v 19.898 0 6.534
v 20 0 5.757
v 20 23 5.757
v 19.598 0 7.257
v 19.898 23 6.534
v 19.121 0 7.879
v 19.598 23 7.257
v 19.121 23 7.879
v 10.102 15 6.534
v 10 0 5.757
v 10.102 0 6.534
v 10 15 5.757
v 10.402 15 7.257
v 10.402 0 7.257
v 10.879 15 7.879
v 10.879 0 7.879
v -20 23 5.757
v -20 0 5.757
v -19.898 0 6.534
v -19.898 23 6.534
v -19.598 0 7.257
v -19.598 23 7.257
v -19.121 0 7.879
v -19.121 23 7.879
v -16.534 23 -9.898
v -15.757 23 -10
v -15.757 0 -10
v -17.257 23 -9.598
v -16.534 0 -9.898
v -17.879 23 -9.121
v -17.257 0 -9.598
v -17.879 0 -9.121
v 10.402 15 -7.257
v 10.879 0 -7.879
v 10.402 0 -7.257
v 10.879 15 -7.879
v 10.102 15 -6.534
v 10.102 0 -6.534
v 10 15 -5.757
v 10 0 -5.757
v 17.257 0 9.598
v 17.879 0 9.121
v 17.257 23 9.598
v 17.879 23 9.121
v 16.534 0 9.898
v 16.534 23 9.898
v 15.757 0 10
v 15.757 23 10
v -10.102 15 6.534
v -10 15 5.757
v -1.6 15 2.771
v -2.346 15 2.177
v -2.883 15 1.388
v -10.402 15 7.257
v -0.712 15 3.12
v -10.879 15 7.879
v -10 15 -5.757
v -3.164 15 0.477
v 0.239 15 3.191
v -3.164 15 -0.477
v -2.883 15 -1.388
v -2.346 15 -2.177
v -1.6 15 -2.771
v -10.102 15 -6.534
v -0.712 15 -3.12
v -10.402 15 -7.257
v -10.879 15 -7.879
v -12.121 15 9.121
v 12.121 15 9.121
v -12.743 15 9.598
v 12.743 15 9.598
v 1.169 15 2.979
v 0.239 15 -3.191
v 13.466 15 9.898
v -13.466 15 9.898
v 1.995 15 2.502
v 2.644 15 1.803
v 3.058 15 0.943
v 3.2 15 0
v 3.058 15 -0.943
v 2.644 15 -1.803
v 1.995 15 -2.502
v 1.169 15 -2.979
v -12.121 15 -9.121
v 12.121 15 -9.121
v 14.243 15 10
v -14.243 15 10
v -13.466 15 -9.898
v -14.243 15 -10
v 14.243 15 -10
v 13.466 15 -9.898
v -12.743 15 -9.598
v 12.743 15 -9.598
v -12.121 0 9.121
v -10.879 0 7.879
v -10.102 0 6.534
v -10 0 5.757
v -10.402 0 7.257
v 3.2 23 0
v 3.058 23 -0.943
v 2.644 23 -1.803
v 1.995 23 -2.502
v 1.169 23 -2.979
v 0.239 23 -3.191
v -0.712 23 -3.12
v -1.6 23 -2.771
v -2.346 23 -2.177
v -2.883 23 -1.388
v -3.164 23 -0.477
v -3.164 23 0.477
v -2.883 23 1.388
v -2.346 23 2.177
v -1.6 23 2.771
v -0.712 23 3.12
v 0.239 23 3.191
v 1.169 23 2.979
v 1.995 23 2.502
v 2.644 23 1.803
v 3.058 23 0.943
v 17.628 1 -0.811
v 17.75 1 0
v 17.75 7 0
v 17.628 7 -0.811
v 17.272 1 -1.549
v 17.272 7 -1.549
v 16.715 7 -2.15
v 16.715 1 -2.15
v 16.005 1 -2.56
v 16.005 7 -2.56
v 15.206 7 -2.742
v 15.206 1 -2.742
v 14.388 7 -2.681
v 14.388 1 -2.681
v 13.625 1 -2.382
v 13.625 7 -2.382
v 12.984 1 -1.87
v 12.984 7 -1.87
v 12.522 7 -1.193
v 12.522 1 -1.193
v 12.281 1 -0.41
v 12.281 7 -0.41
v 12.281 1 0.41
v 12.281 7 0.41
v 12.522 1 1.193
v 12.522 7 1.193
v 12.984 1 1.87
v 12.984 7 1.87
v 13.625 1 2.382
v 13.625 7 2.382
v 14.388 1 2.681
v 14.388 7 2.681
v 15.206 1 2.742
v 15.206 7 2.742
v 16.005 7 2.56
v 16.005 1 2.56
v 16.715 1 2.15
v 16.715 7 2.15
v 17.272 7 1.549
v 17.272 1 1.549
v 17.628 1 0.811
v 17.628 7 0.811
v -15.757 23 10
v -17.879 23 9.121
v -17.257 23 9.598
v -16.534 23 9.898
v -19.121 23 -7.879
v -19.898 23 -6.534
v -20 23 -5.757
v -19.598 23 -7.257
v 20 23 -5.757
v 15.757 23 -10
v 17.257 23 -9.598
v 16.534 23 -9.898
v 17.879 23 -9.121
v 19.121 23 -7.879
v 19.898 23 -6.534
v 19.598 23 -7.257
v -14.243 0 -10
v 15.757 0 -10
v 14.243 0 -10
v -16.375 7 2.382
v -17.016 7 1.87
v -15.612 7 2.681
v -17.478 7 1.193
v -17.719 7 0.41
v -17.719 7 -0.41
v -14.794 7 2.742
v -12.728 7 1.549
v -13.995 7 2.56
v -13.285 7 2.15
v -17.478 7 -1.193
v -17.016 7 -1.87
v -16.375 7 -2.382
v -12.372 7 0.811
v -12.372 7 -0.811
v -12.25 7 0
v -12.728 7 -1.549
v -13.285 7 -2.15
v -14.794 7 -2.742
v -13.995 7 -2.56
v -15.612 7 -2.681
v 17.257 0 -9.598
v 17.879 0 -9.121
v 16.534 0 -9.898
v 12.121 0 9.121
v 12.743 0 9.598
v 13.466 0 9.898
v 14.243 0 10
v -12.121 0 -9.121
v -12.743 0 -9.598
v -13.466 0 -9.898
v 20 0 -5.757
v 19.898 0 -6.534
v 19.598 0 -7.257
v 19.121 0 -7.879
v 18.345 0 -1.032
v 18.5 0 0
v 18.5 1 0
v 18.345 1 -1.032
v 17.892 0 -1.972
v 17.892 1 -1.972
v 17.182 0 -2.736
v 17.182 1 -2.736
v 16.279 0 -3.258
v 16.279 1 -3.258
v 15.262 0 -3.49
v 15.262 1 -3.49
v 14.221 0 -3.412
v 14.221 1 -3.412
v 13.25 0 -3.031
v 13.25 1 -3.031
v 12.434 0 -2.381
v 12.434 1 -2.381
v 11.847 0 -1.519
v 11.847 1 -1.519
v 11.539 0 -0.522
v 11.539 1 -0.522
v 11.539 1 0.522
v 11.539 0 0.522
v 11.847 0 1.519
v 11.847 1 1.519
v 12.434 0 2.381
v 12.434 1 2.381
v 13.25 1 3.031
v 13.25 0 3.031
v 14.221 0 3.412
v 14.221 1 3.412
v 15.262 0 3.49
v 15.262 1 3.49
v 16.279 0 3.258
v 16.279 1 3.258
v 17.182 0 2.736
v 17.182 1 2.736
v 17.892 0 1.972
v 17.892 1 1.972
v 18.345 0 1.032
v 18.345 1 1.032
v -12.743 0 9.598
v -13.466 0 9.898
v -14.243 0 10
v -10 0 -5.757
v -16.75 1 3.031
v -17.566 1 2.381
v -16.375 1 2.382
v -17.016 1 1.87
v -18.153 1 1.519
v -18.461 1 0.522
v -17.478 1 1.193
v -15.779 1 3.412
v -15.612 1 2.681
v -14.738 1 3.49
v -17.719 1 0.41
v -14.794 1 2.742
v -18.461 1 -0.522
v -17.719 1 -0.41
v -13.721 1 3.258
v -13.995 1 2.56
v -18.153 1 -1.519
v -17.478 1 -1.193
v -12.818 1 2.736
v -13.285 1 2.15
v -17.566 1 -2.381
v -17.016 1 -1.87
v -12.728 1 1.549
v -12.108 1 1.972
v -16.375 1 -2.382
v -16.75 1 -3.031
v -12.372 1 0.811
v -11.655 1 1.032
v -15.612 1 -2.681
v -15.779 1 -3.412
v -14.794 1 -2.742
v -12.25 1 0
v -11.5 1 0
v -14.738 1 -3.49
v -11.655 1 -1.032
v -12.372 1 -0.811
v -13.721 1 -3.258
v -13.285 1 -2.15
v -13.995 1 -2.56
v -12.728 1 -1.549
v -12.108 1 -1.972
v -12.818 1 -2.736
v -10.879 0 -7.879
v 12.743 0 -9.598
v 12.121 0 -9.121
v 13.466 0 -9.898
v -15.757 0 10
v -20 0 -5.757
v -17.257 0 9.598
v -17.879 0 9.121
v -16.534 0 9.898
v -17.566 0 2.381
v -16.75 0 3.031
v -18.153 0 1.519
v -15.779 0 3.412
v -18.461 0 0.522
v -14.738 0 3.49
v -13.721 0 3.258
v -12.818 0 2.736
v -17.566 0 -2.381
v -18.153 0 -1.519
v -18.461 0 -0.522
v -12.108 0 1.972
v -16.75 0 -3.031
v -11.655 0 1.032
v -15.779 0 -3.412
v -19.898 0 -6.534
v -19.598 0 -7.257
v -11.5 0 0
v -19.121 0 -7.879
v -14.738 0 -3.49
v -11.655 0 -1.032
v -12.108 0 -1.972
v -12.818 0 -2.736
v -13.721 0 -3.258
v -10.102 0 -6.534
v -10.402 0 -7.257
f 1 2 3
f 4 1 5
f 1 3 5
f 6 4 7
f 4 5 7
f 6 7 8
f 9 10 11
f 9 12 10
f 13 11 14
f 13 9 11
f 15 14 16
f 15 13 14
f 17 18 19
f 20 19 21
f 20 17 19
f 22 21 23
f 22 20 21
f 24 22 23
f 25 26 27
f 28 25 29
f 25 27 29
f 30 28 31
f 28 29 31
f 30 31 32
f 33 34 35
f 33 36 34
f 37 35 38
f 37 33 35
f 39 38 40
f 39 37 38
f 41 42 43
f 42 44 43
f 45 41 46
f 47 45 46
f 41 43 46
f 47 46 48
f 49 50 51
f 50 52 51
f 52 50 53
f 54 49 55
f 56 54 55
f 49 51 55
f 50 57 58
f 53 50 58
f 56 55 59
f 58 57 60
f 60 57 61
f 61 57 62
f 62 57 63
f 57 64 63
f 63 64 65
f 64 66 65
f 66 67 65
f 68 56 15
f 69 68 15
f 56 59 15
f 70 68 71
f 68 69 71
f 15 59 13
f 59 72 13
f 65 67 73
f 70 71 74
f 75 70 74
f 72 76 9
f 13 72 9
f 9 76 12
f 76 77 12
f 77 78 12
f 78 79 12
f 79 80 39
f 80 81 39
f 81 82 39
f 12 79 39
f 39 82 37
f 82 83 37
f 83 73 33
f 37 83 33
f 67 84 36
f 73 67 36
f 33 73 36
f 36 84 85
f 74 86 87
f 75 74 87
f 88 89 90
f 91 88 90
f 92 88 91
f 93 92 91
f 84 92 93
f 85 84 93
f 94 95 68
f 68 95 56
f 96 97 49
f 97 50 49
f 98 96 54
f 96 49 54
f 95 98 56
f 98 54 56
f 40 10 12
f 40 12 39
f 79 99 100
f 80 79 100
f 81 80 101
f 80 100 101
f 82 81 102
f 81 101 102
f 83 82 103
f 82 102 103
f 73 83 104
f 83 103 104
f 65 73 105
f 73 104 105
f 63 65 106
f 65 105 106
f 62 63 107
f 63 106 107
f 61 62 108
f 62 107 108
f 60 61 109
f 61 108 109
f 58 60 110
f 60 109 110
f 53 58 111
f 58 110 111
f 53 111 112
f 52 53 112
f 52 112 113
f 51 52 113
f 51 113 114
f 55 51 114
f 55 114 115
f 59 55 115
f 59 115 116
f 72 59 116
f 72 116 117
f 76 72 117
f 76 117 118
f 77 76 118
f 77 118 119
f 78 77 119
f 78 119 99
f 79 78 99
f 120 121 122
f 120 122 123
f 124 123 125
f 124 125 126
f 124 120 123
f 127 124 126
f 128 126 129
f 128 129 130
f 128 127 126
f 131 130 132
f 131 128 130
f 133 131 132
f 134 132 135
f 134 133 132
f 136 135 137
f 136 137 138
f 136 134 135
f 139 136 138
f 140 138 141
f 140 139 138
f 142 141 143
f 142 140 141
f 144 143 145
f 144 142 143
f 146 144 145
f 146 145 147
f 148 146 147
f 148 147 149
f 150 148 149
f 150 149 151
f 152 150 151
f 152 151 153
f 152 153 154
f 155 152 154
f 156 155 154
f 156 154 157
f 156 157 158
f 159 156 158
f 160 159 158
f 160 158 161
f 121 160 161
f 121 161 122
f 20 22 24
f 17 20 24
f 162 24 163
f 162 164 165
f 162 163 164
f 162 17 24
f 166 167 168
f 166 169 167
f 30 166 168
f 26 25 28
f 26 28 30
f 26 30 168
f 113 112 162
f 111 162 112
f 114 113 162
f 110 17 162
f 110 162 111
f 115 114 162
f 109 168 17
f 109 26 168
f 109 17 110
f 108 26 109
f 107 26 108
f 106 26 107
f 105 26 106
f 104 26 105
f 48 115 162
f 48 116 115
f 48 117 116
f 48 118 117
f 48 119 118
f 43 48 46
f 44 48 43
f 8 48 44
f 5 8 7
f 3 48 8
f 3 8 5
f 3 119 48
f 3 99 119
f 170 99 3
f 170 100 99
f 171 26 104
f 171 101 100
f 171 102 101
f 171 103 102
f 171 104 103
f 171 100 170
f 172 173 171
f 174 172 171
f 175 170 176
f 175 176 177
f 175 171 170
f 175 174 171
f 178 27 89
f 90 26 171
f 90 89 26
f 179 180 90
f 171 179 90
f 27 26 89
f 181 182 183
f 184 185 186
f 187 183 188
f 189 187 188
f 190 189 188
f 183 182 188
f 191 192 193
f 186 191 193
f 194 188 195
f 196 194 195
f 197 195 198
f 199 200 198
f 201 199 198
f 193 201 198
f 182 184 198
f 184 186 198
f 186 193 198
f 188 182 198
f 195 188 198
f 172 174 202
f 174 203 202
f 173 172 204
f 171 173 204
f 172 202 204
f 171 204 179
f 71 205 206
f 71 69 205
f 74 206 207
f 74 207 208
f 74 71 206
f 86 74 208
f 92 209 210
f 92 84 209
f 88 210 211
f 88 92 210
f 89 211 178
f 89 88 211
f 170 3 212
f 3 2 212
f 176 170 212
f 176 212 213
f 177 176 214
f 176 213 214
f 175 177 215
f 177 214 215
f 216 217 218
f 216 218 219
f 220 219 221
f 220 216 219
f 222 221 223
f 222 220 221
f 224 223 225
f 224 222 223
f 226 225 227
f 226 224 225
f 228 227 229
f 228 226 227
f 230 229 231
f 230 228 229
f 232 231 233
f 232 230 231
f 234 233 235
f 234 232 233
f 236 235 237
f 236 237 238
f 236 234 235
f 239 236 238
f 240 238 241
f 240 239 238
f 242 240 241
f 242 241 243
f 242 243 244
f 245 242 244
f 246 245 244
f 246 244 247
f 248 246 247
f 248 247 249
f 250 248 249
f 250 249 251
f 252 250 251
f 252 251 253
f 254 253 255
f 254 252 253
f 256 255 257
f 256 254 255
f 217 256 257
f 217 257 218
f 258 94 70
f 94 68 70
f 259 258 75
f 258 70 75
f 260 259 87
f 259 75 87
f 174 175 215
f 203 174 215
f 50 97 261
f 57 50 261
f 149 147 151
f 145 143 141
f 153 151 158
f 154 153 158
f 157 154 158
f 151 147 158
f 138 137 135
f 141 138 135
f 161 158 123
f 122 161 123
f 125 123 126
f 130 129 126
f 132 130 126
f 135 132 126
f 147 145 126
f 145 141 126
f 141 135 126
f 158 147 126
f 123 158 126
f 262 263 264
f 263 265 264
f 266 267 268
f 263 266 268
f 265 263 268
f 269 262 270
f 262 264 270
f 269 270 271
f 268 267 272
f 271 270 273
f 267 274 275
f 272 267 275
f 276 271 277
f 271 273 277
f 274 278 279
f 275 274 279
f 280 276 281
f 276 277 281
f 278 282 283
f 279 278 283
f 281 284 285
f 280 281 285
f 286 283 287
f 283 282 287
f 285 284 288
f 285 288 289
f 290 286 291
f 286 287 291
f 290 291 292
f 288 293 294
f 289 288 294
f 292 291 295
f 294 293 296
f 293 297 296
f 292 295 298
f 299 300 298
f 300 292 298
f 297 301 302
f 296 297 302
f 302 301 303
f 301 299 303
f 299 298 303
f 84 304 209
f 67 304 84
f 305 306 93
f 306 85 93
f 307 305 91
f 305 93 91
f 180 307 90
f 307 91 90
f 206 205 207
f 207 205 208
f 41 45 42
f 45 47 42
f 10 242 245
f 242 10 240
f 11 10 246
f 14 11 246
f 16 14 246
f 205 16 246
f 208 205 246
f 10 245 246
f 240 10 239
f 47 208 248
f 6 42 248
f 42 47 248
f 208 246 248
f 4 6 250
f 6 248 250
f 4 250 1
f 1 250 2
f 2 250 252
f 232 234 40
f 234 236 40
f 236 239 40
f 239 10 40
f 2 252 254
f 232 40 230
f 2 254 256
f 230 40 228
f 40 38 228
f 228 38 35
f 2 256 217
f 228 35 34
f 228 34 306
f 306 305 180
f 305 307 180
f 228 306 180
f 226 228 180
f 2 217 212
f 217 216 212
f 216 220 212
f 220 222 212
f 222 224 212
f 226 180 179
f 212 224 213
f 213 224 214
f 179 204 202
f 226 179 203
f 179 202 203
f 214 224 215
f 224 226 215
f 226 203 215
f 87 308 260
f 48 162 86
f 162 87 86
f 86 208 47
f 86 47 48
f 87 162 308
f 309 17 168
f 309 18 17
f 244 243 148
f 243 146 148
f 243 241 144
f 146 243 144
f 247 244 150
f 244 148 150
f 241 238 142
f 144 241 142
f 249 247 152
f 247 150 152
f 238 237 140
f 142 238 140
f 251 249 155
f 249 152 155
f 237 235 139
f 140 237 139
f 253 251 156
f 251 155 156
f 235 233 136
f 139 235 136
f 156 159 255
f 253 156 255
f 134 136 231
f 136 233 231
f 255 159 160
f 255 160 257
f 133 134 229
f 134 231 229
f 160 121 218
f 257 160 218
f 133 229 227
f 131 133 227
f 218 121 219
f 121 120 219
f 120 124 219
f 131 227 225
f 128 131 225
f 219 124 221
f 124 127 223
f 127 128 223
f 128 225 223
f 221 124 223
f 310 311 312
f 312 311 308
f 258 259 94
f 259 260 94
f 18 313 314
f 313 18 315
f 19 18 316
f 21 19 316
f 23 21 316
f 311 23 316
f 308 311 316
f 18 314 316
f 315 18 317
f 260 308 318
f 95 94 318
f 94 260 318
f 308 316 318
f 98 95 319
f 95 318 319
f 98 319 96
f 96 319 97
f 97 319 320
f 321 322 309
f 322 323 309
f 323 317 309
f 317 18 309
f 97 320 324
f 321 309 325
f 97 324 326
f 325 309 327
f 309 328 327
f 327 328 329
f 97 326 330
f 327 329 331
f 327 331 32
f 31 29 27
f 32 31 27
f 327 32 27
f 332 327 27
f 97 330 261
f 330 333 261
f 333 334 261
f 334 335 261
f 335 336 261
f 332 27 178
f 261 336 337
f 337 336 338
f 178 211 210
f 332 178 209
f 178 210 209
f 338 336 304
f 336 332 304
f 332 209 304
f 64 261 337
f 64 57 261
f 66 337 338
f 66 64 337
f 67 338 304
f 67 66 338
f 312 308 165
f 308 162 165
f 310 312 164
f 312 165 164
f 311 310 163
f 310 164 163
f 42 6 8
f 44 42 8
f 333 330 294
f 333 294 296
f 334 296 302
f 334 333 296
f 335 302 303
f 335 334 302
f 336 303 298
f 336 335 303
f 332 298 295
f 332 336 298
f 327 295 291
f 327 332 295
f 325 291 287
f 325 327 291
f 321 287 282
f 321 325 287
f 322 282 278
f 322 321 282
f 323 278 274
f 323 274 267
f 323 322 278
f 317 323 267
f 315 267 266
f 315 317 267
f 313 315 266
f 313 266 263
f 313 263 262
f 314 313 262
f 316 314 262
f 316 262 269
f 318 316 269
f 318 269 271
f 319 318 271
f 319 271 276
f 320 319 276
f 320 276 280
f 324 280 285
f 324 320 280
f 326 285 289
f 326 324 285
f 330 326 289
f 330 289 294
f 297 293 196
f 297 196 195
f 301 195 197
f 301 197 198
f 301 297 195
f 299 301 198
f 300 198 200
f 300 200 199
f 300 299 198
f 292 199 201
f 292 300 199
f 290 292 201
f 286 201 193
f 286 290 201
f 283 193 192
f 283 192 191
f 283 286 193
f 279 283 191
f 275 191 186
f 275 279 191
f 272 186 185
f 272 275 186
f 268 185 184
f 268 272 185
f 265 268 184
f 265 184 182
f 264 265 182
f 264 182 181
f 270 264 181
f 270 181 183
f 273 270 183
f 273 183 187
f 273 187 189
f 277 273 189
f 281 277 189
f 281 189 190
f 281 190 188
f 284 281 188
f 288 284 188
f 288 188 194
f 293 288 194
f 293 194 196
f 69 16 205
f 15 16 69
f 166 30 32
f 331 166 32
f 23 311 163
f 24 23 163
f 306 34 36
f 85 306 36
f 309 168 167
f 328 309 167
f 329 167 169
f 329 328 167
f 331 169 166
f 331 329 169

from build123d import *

# Parameters (mm, degrees)
ESQUISSE1_W             = 10
ESQUISSE1_H             = 20
BOSS_EXTRU_1_DEPTH      = 15
BOSS_EXTRU_1_2_DEPTH    = 15
ESQUISSE3_W             = 40
ESQUISSE3_H             = 20
BOSS_EXTRU_2_DEPTH      = 8
ESQUISSE4_R             = 3.2
ENL_V_MAT_EXTRU_1_DEPTH = 10
ESQUISSE1_3_R           = 2.75
ENL_V_MAT_EXTRU_3_DEPTH = 7
ESQUISSE1_4_R           = 3.5
ESQUISSE1_4_R_2         = 2.75
ENL_V_MAT_EXTRU_4_DEPTH = 1
CHANFREIN1_SIZE         = 3
CONG_1_R                = 3


with BuildPart() as part:
    # Esquisse1 → Boss.-Extru.1 (new body)
    with BuildSketch(Plane(origin=(0, 0, 0), x_dir=(1, 0, 0), z_dir=(0, 1, 0))):
        with Locations((-15, 0)):
            Rectangle(ESQUISSE1_W, ESQUISSE1_H)
    extrude(amount=BOSS_EXTRU_1_DEPTH)



with BuildPart() as body_2:
    # Esquisse1 → Boss.-Extru.1 2 (new body)
    with BuildSketch(Plane(origin=(0, 0, 0), x_dir=(1, 0, 0), z_dir=(0, 1, 0))):
        with Locations((15, 0)):
            Rectangle(ESQUISSE1_W, ESQUISSE1_H)
    extrude(amount=BOSS_EXTRU_1_2_DEPTH)


with BuildPart() as part_1:
    add(part.part)

    add(body_2.part)  # Boss.-Extru.2 merges body 2
    # Esquisse3 → Boss.-Extru.2 (add)
    with BuildSketch(Plane(origin=(0, 15, 0), x_dir=(1, 0, 0), z_dir=(0, 1, 0))):
        Rectangle(ESQUISSE3_W, ESQUISSE3_H)
    extrude(amount=BOSS_EXTRU_2_DEPTH)

    # Esquisse4 → Enl_v. mat.-Extru.1 (cut)
    with BuildSketch(Plane(origin=(0, 23, 0), x_dir=(1, 0, 0), z_dir=(0, 1, 0))):
        Circle(ESQUISSE4_R)
    extrude(amount=-ENL_V_MAT_EXTRU_1_DEPTH, mode=Mode.SUBTRACT)

    # Esquisse1_3 → Enl_v. mat.-Extru.3 (cut)
    with BuildSketch(Plane(origin=(0, 0, 0), x_dir=(1, 0, 0), z_dir=(0, 1, 0))):
        with Locations((-15, 0)):
            Circle(ESQUISSE1_3_R)
        with Locations((15, 0)):
            Circle(ESQUISSE1_3_R)
    extrude(amount=ENL_V_MAT_EXTRU_3_DEPTH, mode=Mode.SUBTRACT)

    # Esquisse1_4 → Enl_v. mat.-Extru.4 (cut)
    # profile 1 of 2: a face of its own
    with BuildSketch(Plane(origin=(0, 0, 0), x_dir=(1, 0, 0), z_dir=(0, 1, 0))):
        with Locations((-15, 0)):
            Circle(ESQUISSE1_4_R)
        with Locations((-15, 0)):
            Circle(ESQUISSE1_4_R_2, mode=Mode.SUBTRACT)
    # profile 2 of 2: a face of its own
    with BuildSketch(Plane(origin=(0, 0, 0), x_dir=(1, 0, 0), z_dir=(0, 1, 0))):
        with Locations((15, 0)):
            Circle(ESQUISSE1_4_R)
        with Locations((15, 0)):
            Circle(ESQUISSE1_4_R_2, mode=Mode.SUBTRACT)
    extrude(amount=ENL_V_MAT_EXTRU_4_DEPTH, mode=Mode.SUBTRACT)

    # Chanfrein1
    chanfrein1_edges = [part_1.edges().sort_by_distance(p)[0] for p in [
        (10, 7.5, -10),
        (20, 11.5, -10),
        (10, 7.5, 10),
        (-10, 7.5, -10),
        (-10, 7.5, 10),
        (20, 11.5, 10),
        (-20, 11.5, -10),
        (-20, 11.5, 10),
    ]]
    chamfer(chanfrein1_edges, length=CHANFREIN1_SIZE)

    # Cong_1
    cong_1_edges = [part_1.edges().sort_by_distance(p)[0] for p in [
        (-10, 7.5, -7),
        (-13, 7.5, -10),
        (10, 7.5, -7),
        (13, 7.5, -10),
        (13, 7.5, 10),
        (17, 11.5, 10),
        (20, 11.5, 7),
        (20, 11.5, -7),
        (17, 11.5, -10),
        (-17, 11.5, -10),
        (-20, 11.5, -7),
        (-20, 11.5, 7),
        (-17, 11.5, 10),
        (-10, 7.5, 7),
        (-13, 7.5, 10),
        (10, 7.5, 7),
    ]]
    fillet(cong_1_edges, radius=CONG_1_R)


solid = part_1.part
